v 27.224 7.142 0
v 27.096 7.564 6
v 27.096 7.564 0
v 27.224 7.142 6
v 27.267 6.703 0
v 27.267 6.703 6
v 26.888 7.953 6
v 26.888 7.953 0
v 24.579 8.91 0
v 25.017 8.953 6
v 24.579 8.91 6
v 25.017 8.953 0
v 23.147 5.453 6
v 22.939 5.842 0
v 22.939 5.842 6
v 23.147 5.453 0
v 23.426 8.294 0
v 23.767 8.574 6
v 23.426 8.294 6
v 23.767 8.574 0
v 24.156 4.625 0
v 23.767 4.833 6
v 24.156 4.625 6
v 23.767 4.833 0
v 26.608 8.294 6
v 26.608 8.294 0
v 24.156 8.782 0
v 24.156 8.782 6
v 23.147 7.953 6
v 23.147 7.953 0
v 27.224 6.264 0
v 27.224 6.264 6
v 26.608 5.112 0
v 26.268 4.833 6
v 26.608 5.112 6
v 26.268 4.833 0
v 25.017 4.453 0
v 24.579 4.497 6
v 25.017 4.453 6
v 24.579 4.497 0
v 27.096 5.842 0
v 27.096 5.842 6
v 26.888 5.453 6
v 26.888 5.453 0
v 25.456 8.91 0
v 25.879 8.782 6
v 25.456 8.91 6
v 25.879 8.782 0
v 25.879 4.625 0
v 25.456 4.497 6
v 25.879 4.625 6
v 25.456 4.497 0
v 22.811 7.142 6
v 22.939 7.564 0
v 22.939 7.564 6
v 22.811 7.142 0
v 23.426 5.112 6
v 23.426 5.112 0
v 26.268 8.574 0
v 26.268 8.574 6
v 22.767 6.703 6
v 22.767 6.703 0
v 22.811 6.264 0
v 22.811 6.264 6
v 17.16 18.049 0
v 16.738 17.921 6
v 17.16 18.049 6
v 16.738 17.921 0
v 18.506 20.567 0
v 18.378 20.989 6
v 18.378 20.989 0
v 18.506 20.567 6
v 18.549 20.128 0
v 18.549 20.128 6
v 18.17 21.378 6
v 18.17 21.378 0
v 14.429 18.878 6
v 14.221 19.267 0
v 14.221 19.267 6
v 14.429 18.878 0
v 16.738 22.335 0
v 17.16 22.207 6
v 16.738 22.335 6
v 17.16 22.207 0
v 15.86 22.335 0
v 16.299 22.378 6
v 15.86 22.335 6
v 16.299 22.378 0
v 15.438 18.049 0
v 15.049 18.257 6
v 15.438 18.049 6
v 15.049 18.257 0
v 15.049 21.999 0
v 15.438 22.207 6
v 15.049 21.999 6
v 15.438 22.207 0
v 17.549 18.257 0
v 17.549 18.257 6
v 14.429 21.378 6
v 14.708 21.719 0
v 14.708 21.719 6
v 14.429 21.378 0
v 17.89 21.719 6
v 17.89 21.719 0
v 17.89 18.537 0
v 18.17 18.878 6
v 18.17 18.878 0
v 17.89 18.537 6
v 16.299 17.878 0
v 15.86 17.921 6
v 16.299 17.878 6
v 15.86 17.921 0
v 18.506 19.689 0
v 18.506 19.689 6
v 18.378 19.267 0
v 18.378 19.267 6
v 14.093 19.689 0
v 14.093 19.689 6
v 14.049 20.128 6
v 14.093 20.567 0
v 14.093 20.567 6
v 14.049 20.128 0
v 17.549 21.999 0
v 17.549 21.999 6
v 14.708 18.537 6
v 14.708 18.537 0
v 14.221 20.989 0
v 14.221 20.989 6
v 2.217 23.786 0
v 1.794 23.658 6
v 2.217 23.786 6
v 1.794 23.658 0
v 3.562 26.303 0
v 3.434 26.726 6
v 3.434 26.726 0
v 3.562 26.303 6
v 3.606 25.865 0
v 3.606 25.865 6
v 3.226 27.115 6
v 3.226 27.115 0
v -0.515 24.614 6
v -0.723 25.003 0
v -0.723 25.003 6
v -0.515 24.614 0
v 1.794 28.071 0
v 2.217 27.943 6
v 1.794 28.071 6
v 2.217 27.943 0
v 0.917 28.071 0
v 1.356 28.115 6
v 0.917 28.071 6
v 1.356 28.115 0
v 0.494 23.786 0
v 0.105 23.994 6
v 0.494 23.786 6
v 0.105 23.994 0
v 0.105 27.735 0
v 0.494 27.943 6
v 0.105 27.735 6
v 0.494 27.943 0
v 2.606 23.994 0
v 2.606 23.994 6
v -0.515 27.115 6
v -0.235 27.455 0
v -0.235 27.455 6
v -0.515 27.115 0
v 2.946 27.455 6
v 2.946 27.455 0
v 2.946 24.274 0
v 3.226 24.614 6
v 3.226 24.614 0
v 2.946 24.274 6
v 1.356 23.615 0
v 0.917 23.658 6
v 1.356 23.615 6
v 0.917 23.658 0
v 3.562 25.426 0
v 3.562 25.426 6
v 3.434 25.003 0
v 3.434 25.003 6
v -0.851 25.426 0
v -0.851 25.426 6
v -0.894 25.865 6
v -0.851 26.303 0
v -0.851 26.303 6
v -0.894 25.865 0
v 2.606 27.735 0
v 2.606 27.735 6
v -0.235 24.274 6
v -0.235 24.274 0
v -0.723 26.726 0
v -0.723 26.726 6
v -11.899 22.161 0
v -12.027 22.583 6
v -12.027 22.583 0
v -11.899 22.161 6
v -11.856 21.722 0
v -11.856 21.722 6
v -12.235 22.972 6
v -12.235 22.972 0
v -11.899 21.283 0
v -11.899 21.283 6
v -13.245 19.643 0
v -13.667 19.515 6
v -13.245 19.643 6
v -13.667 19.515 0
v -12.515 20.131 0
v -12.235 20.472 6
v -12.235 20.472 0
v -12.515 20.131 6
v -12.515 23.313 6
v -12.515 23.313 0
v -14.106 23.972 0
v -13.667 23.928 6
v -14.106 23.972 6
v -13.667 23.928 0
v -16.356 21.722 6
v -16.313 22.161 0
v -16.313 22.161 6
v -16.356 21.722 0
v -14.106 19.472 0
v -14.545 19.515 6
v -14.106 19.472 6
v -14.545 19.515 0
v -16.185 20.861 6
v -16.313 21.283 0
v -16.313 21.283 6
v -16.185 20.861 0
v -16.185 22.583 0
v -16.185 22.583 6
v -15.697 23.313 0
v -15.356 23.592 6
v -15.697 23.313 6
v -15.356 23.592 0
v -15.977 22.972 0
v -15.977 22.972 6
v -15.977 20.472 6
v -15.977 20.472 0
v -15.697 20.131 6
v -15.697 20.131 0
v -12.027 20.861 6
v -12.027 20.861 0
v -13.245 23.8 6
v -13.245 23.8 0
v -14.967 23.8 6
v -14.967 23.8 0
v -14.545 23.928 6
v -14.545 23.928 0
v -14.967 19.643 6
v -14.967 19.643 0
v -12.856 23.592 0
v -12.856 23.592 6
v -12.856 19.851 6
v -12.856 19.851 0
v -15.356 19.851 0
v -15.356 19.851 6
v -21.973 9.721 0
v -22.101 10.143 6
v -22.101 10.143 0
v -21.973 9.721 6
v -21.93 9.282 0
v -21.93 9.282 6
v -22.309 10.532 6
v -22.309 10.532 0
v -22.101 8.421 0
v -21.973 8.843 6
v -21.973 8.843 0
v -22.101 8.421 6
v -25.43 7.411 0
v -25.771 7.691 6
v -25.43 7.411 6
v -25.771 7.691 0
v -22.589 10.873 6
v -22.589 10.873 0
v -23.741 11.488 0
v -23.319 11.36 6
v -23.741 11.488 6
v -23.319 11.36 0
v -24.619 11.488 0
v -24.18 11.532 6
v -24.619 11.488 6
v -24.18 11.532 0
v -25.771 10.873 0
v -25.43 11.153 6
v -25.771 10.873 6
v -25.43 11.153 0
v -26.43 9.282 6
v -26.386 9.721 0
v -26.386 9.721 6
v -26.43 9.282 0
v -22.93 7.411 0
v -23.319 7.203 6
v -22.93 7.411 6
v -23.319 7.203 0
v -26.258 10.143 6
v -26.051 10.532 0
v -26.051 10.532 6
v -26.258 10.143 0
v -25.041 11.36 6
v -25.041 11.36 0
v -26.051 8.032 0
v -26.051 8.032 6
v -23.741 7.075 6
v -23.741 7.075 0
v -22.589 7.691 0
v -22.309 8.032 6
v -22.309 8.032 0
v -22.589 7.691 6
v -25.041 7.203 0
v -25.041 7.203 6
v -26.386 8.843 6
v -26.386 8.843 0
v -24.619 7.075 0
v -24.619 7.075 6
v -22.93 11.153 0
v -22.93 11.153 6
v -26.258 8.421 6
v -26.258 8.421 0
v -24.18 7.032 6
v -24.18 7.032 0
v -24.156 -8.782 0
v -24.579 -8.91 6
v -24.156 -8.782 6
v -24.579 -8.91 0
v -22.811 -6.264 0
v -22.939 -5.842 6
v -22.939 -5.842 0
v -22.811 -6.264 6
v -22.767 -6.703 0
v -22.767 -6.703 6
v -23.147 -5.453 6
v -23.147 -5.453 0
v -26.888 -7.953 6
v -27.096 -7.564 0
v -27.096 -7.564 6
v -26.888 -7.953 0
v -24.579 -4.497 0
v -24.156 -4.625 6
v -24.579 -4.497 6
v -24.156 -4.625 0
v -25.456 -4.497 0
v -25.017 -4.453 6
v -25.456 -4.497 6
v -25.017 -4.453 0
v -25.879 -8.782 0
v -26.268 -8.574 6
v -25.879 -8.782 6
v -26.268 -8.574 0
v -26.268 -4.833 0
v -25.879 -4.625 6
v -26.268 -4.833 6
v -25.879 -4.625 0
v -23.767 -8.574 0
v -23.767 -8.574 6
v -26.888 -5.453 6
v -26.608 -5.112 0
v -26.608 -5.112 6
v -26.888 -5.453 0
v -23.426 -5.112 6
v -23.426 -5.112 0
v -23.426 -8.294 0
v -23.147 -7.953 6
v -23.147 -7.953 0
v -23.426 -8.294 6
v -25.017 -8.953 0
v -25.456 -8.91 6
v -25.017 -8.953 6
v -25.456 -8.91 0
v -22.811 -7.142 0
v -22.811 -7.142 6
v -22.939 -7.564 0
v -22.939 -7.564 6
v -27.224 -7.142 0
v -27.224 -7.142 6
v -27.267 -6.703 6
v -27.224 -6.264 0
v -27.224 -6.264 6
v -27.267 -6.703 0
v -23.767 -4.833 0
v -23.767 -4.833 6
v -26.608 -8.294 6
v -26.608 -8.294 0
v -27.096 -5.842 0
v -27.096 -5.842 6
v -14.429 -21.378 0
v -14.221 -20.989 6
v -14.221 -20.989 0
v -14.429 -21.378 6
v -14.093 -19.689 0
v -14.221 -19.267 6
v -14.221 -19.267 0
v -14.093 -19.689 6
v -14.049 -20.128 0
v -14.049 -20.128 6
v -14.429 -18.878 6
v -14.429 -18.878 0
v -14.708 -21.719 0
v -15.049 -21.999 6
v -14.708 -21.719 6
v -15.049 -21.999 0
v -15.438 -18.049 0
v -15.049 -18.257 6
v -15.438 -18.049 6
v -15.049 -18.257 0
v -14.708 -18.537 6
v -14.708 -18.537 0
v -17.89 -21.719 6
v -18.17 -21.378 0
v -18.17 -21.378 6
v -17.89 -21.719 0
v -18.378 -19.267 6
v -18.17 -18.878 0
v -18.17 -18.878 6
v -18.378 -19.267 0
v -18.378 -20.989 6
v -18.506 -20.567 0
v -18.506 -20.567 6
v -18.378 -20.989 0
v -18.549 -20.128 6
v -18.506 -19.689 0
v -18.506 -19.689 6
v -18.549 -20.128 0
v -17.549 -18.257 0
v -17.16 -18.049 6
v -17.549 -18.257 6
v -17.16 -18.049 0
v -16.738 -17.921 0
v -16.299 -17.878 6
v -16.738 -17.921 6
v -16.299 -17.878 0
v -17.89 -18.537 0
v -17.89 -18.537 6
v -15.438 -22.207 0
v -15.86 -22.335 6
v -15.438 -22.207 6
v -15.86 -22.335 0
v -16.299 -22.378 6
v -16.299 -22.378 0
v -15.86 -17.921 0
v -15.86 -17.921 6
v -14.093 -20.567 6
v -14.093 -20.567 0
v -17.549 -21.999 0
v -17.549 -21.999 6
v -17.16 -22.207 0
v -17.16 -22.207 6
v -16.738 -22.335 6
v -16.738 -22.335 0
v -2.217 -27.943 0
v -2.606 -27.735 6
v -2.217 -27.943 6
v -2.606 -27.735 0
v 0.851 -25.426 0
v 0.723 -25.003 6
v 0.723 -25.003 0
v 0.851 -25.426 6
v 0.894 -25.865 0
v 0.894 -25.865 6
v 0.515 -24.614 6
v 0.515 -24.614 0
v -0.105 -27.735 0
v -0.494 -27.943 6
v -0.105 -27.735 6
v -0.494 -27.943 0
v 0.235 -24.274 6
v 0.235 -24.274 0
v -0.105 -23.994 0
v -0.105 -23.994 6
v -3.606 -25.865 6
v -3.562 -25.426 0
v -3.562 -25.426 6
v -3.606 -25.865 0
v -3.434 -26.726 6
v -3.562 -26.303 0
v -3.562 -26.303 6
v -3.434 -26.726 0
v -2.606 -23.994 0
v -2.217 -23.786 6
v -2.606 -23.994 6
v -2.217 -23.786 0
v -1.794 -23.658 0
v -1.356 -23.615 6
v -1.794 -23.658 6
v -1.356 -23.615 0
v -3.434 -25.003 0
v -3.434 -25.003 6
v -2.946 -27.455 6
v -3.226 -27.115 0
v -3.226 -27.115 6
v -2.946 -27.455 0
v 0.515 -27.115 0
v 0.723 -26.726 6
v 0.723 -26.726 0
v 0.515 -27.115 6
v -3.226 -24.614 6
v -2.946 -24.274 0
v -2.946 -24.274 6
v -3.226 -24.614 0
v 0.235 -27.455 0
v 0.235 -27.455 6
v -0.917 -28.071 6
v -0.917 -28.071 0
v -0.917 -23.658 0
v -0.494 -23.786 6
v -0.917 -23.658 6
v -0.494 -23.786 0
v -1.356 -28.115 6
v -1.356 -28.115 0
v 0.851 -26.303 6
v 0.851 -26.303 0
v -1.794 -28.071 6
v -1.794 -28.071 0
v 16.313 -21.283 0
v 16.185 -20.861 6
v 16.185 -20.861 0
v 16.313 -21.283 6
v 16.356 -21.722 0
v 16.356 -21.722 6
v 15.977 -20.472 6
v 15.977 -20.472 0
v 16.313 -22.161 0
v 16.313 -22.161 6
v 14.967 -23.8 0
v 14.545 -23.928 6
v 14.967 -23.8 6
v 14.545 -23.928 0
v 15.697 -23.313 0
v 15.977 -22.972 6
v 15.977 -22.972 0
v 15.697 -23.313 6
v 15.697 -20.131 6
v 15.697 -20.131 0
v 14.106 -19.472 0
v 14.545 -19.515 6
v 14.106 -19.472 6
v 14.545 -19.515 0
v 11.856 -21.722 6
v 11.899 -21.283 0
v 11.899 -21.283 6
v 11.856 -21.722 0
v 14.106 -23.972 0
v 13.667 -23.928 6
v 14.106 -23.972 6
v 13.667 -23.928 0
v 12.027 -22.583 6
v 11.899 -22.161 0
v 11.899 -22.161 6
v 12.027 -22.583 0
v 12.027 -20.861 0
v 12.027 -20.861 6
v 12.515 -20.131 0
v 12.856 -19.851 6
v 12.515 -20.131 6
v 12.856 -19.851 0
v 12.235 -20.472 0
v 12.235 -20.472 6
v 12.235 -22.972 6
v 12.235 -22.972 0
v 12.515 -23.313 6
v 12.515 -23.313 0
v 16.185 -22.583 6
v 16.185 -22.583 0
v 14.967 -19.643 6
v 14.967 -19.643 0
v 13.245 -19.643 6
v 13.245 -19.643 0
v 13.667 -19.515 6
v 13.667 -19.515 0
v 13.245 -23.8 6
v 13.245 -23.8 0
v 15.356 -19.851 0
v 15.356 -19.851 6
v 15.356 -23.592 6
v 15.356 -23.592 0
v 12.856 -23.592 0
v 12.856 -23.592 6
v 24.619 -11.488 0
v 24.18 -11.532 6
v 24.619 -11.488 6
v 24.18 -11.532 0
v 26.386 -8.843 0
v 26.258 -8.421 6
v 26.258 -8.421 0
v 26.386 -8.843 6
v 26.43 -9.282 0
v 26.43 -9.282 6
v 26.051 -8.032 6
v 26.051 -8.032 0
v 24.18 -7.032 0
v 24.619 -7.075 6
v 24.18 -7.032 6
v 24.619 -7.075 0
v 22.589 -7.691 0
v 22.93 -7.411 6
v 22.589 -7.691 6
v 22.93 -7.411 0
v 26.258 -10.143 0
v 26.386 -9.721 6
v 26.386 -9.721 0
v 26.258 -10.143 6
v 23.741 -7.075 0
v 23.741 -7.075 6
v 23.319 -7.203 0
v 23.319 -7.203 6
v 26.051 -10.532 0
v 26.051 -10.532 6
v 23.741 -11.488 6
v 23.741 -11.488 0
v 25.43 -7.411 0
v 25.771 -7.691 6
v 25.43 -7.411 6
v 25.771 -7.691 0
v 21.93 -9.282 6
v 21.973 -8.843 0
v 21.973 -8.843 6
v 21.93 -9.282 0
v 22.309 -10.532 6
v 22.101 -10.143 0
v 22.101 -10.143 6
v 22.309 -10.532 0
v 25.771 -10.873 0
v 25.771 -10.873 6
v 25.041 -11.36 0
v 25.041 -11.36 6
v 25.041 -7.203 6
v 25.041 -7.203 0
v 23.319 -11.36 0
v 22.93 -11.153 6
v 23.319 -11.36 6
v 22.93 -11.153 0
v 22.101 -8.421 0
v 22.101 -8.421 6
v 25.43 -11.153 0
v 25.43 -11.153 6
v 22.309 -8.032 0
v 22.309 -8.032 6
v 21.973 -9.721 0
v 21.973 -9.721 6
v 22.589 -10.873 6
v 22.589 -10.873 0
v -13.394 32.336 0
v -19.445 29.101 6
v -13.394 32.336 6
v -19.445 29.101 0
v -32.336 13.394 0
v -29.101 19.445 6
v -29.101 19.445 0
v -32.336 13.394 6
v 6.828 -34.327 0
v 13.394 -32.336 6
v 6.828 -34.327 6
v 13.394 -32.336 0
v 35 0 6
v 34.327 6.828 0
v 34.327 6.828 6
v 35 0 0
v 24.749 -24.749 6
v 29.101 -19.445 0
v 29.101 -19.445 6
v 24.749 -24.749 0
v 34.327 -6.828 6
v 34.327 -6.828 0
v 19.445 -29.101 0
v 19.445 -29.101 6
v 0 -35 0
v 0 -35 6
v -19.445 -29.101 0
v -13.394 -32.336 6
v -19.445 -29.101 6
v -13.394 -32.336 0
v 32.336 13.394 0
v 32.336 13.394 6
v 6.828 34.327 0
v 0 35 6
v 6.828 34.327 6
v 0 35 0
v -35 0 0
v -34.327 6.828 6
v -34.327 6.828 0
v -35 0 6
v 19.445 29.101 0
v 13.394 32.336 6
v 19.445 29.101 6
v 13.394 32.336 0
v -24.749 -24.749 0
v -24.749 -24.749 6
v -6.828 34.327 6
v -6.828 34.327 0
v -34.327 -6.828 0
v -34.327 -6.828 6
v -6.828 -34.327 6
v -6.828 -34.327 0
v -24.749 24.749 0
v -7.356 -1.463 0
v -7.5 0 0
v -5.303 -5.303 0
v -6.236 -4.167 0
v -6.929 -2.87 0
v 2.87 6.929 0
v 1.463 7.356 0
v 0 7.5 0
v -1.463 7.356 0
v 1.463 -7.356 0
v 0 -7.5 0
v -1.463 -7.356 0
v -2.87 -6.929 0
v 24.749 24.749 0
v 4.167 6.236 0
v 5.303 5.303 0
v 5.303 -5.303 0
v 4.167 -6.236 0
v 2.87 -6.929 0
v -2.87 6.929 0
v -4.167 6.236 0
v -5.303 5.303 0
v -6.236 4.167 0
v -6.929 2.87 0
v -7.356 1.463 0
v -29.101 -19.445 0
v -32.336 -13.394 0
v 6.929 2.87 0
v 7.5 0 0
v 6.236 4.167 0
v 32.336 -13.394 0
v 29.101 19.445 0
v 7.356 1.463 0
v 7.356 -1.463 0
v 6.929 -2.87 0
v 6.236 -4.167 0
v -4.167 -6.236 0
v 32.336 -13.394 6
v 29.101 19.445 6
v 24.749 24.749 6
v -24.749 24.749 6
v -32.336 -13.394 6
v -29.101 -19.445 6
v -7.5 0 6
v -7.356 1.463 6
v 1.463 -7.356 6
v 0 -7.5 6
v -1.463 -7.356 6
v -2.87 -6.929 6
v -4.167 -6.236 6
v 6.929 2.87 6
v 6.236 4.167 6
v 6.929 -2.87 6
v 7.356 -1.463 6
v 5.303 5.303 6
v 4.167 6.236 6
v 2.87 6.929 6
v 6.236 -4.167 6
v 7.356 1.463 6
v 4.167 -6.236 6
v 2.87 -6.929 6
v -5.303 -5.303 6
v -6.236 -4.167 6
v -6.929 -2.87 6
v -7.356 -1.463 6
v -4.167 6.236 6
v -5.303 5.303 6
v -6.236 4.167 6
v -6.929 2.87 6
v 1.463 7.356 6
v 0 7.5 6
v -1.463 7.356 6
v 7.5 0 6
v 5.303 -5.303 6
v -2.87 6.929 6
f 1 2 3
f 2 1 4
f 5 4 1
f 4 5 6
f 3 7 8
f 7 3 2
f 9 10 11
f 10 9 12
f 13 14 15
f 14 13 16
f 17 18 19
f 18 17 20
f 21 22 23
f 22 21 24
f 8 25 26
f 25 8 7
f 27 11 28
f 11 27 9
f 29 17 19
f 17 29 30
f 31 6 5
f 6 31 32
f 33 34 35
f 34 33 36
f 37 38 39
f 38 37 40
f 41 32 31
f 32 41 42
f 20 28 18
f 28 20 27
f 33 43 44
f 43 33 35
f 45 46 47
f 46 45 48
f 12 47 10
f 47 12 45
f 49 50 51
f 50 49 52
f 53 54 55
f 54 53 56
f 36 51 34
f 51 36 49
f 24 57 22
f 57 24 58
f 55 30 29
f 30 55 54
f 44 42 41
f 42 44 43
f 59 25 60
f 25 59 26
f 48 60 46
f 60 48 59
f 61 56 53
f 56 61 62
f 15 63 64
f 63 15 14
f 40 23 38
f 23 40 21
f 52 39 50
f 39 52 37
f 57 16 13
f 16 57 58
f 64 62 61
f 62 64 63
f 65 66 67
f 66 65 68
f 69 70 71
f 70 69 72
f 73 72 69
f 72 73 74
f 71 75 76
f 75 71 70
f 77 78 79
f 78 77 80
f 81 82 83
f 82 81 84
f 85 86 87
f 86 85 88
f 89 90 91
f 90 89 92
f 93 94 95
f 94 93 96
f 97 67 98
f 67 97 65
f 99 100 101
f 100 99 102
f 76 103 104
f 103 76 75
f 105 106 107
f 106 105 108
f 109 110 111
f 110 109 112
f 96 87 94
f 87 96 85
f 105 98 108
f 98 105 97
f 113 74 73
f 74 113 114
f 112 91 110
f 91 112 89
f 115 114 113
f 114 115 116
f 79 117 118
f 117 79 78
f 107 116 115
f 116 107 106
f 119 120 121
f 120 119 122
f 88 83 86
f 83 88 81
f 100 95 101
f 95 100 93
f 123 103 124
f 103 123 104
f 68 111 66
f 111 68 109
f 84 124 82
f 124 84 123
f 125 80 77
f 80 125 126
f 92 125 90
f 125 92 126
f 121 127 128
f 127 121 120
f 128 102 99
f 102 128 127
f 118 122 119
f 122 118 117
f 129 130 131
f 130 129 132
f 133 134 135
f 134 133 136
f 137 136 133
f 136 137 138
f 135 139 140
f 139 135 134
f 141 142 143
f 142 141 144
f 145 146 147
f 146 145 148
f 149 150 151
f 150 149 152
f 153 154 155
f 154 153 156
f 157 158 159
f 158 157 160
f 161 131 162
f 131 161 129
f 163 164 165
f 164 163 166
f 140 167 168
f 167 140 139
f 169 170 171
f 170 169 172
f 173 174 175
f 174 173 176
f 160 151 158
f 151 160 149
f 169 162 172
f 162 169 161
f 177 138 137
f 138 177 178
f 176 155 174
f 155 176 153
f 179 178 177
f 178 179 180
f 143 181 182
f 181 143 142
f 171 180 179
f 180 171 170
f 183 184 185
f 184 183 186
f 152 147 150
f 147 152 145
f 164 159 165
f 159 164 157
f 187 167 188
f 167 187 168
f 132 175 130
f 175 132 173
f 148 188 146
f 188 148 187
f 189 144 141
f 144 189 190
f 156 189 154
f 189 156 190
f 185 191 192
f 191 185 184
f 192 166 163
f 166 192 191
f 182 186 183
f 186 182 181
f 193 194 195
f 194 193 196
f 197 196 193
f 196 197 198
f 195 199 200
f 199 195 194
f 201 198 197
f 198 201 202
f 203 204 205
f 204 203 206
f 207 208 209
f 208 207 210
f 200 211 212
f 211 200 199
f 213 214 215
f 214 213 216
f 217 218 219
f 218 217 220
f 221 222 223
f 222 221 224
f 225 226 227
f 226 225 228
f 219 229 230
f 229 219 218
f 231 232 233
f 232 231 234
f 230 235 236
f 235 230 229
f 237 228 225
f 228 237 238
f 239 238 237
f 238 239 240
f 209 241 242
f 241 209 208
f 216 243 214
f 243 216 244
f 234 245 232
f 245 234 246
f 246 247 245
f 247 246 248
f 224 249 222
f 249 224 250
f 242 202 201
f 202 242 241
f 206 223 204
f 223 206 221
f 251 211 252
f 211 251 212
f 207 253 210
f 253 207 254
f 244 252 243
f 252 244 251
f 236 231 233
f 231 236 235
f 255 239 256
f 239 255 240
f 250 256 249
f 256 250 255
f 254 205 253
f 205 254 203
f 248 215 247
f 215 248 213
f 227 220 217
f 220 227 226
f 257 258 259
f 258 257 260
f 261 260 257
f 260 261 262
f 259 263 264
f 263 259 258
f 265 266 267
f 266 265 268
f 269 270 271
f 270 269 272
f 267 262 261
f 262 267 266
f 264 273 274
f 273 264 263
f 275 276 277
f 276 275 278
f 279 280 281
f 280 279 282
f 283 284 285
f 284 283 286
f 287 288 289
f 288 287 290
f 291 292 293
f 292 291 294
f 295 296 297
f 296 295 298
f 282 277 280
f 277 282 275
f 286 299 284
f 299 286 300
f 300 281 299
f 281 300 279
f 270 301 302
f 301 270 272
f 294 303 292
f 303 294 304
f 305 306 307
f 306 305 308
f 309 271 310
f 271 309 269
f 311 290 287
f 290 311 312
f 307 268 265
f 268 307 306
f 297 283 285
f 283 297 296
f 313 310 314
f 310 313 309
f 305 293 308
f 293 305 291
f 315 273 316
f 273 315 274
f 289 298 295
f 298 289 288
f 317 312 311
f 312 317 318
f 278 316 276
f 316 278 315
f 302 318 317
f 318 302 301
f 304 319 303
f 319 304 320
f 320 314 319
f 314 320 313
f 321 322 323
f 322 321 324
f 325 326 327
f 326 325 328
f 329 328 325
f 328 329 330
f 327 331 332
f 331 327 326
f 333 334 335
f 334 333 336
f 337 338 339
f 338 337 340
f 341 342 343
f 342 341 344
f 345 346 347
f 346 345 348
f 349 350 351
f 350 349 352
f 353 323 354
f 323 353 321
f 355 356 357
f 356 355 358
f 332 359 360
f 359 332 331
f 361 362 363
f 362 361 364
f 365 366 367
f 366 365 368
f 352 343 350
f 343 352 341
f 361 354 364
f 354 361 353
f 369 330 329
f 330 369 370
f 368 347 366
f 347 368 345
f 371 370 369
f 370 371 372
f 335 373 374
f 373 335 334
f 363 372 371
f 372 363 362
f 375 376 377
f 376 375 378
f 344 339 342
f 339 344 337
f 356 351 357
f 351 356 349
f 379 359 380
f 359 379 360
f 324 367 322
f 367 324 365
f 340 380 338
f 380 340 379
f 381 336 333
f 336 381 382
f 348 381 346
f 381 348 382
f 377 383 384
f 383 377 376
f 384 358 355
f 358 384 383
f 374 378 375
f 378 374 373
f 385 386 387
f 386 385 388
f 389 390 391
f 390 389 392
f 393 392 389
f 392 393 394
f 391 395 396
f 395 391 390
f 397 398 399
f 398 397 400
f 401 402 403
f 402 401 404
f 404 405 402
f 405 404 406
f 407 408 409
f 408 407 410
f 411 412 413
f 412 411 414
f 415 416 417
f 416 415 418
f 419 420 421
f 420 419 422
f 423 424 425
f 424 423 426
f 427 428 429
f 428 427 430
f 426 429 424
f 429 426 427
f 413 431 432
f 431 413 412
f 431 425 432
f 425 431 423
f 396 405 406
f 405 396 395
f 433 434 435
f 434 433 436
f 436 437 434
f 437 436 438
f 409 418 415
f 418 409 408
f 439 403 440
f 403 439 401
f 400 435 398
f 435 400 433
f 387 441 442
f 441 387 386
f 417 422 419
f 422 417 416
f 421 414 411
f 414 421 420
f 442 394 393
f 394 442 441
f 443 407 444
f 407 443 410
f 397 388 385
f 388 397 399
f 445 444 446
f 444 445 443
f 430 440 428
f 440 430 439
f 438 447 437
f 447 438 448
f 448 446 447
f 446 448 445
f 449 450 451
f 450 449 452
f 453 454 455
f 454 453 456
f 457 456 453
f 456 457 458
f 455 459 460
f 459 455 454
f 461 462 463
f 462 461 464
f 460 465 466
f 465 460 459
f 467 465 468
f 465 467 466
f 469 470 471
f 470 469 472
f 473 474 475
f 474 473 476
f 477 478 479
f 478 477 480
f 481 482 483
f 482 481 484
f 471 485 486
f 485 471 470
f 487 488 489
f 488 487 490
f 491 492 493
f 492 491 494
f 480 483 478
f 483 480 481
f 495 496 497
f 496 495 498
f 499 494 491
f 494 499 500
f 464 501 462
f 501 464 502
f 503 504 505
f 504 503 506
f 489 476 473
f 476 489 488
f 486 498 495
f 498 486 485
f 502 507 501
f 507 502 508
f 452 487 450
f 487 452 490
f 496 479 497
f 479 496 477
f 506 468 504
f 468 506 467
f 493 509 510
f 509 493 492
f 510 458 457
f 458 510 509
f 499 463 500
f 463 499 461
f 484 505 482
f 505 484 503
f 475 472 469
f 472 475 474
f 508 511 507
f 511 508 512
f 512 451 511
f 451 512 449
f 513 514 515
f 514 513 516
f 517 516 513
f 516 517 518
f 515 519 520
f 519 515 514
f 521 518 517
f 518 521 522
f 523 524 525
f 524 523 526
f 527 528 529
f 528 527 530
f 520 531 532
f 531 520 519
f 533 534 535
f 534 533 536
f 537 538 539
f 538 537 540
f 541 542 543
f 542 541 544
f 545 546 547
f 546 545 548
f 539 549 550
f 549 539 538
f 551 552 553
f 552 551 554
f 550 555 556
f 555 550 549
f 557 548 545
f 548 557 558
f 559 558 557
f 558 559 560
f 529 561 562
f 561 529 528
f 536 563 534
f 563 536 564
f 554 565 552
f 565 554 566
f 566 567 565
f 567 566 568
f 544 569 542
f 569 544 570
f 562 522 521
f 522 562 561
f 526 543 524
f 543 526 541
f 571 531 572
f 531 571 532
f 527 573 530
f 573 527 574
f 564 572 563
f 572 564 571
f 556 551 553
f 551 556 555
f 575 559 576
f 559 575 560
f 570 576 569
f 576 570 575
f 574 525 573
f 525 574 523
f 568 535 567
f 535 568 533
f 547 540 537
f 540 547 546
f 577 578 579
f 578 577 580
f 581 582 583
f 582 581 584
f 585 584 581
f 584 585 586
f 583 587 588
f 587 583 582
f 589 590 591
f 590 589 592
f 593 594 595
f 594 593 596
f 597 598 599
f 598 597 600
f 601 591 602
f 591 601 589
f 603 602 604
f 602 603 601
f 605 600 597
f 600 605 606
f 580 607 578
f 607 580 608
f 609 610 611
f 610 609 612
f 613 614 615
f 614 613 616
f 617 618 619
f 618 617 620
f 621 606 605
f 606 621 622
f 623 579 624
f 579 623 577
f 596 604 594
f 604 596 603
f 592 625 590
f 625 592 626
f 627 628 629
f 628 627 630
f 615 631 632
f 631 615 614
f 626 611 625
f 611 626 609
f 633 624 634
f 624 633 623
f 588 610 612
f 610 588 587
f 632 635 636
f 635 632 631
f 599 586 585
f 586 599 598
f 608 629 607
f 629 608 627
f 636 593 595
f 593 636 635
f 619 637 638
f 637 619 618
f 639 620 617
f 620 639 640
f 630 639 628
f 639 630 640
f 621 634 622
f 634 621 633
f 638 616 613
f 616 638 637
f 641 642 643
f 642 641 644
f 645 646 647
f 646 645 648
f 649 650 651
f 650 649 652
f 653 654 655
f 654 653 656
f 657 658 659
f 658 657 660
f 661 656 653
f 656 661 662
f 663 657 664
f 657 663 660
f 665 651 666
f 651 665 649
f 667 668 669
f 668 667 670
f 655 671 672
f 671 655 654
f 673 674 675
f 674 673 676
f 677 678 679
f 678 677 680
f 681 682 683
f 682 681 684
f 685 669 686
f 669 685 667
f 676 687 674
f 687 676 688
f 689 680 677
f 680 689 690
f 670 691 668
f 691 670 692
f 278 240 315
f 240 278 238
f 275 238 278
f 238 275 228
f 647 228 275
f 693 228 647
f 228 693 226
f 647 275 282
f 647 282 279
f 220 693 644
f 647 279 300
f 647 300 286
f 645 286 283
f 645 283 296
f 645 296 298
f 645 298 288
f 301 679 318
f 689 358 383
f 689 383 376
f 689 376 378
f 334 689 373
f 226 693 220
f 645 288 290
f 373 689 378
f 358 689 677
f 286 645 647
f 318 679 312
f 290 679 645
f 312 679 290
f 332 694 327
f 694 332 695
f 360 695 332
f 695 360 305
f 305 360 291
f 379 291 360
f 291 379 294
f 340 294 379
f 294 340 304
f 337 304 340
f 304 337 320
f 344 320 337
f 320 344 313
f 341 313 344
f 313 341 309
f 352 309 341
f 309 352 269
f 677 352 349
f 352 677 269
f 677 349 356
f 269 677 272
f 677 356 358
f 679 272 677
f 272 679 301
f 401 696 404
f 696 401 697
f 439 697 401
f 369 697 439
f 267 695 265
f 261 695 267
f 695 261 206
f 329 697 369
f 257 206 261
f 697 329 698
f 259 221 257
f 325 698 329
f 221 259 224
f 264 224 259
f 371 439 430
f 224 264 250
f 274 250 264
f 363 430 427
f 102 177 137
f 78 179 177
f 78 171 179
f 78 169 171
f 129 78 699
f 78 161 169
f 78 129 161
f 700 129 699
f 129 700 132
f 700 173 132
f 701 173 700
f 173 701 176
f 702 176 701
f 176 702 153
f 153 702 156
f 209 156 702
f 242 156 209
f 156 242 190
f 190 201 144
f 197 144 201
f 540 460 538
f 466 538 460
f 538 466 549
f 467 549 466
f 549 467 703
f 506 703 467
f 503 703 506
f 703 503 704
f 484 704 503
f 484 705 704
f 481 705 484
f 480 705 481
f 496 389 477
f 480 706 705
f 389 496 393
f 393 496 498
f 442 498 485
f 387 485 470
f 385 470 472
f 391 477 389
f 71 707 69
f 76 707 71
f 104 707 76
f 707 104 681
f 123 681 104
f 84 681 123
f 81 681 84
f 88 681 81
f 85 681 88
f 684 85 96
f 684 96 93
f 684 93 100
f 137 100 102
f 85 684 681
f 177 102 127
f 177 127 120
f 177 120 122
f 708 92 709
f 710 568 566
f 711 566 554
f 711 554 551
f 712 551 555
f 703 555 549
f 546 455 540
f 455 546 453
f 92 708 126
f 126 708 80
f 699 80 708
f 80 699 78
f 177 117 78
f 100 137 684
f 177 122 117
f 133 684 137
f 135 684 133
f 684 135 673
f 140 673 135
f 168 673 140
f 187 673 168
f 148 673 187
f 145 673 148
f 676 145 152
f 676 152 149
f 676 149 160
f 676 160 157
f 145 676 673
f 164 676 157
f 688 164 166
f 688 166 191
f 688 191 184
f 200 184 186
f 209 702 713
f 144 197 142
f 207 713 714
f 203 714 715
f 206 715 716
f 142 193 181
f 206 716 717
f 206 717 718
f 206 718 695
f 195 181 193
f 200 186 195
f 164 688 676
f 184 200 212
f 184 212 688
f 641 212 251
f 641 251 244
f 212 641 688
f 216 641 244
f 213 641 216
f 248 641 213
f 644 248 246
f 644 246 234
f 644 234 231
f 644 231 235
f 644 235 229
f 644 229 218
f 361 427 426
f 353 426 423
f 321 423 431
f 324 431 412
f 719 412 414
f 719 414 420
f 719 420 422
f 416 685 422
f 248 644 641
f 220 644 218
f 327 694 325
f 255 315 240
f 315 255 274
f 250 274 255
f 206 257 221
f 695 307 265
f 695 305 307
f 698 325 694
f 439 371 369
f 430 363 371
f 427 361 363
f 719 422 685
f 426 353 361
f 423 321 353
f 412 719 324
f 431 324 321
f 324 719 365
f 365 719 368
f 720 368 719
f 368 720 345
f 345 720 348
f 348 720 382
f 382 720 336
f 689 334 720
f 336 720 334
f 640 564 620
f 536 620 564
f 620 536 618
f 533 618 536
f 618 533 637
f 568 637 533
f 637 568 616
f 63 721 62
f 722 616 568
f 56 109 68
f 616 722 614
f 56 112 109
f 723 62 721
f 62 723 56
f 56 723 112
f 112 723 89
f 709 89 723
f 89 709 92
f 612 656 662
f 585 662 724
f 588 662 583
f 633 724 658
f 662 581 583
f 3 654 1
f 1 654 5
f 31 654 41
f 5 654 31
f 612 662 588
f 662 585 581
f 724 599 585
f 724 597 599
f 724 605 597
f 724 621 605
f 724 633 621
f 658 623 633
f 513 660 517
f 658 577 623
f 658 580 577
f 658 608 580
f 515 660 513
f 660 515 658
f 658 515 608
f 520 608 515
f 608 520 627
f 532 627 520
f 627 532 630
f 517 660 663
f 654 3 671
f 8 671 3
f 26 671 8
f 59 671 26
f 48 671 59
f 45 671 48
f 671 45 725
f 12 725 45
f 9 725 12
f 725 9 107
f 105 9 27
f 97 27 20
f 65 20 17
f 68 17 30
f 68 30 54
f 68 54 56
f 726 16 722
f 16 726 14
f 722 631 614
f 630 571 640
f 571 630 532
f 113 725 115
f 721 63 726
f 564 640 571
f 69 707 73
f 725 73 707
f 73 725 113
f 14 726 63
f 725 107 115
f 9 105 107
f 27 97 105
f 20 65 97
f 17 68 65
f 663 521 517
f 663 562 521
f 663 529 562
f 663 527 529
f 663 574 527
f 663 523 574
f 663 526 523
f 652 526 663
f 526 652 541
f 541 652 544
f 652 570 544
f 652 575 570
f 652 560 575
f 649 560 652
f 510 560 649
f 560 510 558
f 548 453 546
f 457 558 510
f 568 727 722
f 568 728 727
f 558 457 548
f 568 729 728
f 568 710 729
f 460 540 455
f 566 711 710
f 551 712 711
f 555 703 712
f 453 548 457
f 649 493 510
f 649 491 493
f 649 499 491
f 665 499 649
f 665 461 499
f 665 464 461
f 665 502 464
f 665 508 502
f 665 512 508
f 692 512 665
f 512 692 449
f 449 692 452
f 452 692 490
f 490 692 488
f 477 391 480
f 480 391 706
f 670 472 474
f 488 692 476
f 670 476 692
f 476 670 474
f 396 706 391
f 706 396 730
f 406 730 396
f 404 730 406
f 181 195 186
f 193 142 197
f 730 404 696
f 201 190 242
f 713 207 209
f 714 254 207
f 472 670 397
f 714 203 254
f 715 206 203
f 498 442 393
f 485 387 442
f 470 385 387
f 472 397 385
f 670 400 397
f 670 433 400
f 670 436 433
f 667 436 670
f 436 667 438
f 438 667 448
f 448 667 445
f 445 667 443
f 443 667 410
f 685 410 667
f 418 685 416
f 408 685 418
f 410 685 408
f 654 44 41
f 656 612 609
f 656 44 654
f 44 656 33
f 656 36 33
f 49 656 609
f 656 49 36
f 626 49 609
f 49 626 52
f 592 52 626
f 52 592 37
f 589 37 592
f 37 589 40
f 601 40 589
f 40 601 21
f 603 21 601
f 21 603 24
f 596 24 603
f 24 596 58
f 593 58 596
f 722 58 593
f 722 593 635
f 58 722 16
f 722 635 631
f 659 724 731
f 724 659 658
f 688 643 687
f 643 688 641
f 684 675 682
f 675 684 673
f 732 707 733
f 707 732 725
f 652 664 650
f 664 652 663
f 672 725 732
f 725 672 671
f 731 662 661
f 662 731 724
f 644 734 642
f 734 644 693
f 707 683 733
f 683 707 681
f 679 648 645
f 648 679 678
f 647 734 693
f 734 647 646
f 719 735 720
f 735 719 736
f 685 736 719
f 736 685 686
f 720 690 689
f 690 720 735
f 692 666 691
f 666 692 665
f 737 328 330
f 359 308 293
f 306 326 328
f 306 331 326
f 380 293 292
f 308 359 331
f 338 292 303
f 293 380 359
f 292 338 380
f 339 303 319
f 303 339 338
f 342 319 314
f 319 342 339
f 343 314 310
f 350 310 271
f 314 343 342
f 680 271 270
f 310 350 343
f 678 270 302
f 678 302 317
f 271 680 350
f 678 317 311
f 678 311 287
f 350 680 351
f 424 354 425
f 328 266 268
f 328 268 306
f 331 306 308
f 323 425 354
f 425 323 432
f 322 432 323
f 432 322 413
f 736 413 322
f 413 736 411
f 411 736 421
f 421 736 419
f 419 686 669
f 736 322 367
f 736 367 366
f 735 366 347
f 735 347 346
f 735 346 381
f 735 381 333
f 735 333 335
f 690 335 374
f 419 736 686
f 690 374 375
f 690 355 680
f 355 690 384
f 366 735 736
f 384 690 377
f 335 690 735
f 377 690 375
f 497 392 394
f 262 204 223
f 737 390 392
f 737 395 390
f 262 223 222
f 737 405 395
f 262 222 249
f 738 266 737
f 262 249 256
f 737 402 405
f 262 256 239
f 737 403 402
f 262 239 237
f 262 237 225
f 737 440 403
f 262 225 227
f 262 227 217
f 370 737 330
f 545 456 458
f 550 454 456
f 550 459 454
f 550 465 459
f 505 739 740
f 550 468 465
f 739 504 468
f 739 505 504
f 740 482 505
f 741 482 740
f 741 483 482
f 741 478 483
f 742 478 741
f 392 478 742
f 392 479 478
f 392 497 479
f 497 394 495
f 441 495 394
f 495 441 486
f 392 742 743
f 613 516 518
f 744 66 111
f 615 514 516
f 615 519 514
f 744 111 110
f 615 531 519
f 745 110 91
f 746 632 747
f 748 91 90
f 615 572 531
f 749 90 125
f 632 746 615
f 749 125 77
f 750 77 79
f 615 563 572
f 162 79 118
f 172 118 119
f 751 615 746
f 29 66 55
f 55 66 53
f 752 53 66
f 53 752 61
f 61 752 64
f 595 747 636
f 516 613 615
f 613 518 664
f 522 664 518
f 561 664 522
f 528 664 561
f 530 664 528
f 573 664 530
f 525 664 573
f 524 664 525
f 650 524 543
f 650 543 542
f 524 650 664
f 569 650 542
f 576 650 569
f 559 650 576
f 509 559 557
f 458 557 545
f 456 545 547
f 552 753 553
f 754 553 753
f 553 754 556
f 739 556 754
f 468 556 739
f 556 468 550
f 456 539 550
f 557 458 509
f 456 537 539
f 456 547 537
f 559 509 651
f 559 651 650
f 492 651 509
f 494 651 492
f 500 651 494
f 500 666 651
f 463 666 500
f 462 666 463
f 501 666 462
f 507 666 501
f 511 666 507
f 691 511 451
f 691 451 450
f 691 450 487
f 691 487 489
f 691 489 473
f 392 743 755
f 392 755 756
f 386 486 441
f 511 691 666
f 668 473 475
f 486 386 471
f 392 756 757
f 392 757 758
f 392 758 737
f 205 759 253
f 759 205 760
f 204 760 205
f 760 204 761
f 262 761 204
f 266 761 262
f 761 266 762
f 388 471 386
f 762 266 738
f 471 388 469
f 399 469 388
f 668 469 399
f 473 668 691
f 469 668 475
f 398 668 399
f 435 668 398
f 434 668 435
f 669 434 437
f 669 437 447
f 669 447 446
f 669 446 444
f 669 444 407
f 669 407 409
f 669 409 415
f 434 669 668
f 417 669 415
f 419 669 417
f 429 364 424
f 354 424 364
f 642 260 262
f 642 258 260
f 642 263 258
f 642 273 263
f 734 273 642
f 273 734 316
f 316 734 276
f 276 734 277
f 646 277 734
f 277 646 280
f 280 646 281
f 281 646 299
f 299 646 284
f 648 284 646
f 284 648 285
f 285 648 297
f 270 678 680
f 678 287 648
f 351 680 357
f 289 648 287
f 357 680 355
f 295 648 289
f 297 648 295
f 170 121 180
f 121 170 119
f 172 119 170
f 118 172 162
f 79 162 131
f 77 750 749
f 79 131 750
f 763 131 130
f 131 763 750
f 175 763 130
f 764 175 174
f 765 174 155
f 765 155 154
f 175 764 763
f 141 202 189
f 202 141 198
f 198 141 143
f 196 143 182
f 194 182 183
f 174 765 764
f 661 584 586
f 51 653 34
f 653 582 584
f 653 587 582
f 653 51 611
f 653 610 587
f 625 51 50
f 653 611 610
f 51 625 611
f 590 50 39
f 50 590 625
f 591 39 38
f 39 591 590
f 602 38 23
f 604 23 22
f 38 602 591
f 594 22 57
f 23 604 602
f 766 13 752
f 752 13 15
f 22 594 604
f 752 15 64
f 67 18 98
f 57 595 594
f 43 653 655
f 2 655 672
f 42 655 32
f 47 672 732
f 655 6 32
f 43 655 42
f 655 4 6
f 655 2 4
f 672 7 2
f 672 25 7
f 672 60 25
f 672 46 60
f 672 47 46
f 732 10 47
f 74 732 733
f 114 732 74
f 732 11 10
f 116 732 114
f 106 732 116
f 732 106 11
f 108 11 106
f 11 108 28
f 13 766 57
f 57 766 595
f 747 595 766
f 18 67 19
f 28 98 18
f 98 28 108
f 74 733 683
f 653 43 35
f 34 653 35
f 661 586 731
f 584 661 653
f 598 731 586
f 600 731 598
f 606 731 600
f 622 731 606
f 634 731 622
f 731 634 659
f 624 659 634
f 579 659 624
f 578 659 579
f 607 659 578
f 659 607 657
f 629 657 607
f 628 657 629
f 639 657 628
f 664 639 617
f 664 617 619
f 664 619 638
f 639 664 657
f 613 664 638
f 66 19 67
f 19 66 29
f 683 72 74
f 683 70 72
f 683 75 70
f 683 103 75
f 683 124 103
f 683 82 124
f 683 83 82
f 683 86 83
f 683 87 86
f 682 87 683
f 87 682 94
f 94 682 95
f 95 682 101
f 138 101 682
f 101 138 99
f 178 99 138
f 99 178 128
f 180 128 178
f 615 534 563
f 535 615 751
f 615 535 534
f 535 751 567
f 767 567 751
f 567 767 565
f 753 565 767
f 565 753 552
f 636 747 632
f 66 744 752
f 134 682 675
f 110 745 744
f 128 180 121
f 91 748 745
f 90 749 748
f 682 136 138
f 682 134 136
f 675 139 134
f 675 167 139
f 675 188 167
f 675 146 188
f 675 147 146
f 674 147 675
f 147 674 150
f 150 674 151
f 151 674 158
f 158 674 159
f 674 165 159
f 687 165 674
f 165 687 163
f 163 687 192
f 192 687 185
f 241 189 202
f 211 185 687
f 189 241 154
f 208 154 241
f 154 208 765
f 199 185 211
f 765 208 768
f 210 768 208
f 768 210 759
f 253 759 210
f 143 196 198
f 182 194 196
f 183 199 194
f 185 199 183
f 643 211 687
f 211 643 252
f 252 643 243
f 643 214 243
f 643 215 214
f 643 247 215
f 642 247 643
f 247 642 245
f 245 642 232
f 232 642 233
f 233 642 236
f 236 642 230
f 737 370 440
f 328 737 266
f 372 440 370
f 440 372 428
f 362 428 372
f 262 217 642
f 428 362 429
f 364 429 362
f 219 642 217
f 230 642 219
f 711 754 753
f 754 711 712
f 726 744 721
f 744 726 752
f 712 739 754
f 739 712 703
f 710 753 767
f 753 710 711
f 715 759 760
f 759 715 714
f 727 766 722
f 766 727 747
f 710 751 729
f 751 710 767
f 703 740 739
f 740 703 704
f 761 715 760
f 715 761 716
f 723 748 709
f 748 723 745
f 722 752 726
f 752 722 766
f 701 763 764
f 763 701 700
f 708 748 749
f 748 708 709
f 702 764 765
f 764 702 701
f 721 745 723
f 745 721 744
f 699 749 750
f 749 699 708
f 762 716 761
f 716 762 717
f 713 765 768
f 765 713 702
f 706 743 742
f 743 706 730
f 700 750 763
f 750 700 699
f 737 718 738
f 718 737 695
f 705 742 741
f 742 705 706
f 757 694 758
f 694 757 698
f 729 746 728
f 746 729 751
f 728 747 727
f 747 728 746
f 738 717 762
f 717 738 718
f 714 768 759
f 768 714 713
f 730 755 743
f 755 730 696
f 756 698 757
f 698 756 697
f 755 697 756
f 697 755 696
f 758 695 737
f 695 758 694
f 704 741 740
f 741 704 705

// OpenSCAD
$fn = 32;

// ----------------------------------------------------------------------
// Flange Ø70 x 6
// 10 holes on a Ø51.8 bolt circle, bolted joints
// ----------------------------------------------------------------------

// --- parameters (mm) ---
flange_d = 70;   // outside diameter of the flange
thickness = 6;   // flange thickness
holes = 10;      // number of bolt holes
pcd = 51.8;      // bolt circle diameter
start_deg = 15;  // angle of the first hole, from +X
hole_d = 4.5;    // bolt hole diameter
bore_d = 15;     // central through bore
hub_d = 25;      // hub outside diameter
hub_h = 0;       // hub height above the flange face (0 = no hub)

// --- derived feature positions (mm) ---
height = thickness + hub_h;  // = 6   overall height of the part
pcd_r = pcd / 2;             // = 25.9   bolt circle radius
hole_step = 360 / holes;     // = 36   angular pitch
feature_centers = [
  [pcd_r * cos(start_deg + 0 * hole_step), pcd_r * sin(start_deg + 0 * hole_step)],
  [pcd_r * cos(start_deg + 1 * hole_step), pcd_r * sin(start_deg + 1 * hole_step)],
  [pcd_r * cos(start_deg + 2 * hole_step), pcd_r * sin(start_deg + 2 * hole_step)],
  [pcd_r * cos(start_deg + 3 * hole_step), pcd_r * sin(start_deg + 3 * hole_step)],
  [pcd_r * cos(start_deg + 4 * hole_step), pcd_r * sin(start_deg + 4 * hole_step)],
  [pcd_r * cos(start_deg + 5 * hole_step), pcd_r * sin(start_deg + 5 * hole_step)],
  [pcd_r * cos(start_deg + 6 * hole_step), pcd_r * sin(start_deg + 6 * hole_step)],
  [pcd_r * cos(start_deg + 7 * hole_step), pcd_r * sin(start_deg + 7 * hole_step)],
  [pcd_r * cos(start_deg + 8 * hole_step), pcd_r * sin(start_deg + 8 * hole_step)],
  [pcd_r * cos(start_deg + 9 * hole_step), pcd_r * sin(start_deg + 9 * hole_step)]
];   // bolt hole centres on the pitch circle

// flange disc, every hole and the bore cut straight through
difference() {
  union() {
    cylinder(d = flange_d, h = thickness);
  }
  translate([0, 0, -1]) cylinder(d = bore_d, h = height + 2);  // bore, through
  for (centre = feature_centers)
    translate([centre[0], centre[1], -1]) cylinder(d = hole_d, h = thickness + 2);
}
